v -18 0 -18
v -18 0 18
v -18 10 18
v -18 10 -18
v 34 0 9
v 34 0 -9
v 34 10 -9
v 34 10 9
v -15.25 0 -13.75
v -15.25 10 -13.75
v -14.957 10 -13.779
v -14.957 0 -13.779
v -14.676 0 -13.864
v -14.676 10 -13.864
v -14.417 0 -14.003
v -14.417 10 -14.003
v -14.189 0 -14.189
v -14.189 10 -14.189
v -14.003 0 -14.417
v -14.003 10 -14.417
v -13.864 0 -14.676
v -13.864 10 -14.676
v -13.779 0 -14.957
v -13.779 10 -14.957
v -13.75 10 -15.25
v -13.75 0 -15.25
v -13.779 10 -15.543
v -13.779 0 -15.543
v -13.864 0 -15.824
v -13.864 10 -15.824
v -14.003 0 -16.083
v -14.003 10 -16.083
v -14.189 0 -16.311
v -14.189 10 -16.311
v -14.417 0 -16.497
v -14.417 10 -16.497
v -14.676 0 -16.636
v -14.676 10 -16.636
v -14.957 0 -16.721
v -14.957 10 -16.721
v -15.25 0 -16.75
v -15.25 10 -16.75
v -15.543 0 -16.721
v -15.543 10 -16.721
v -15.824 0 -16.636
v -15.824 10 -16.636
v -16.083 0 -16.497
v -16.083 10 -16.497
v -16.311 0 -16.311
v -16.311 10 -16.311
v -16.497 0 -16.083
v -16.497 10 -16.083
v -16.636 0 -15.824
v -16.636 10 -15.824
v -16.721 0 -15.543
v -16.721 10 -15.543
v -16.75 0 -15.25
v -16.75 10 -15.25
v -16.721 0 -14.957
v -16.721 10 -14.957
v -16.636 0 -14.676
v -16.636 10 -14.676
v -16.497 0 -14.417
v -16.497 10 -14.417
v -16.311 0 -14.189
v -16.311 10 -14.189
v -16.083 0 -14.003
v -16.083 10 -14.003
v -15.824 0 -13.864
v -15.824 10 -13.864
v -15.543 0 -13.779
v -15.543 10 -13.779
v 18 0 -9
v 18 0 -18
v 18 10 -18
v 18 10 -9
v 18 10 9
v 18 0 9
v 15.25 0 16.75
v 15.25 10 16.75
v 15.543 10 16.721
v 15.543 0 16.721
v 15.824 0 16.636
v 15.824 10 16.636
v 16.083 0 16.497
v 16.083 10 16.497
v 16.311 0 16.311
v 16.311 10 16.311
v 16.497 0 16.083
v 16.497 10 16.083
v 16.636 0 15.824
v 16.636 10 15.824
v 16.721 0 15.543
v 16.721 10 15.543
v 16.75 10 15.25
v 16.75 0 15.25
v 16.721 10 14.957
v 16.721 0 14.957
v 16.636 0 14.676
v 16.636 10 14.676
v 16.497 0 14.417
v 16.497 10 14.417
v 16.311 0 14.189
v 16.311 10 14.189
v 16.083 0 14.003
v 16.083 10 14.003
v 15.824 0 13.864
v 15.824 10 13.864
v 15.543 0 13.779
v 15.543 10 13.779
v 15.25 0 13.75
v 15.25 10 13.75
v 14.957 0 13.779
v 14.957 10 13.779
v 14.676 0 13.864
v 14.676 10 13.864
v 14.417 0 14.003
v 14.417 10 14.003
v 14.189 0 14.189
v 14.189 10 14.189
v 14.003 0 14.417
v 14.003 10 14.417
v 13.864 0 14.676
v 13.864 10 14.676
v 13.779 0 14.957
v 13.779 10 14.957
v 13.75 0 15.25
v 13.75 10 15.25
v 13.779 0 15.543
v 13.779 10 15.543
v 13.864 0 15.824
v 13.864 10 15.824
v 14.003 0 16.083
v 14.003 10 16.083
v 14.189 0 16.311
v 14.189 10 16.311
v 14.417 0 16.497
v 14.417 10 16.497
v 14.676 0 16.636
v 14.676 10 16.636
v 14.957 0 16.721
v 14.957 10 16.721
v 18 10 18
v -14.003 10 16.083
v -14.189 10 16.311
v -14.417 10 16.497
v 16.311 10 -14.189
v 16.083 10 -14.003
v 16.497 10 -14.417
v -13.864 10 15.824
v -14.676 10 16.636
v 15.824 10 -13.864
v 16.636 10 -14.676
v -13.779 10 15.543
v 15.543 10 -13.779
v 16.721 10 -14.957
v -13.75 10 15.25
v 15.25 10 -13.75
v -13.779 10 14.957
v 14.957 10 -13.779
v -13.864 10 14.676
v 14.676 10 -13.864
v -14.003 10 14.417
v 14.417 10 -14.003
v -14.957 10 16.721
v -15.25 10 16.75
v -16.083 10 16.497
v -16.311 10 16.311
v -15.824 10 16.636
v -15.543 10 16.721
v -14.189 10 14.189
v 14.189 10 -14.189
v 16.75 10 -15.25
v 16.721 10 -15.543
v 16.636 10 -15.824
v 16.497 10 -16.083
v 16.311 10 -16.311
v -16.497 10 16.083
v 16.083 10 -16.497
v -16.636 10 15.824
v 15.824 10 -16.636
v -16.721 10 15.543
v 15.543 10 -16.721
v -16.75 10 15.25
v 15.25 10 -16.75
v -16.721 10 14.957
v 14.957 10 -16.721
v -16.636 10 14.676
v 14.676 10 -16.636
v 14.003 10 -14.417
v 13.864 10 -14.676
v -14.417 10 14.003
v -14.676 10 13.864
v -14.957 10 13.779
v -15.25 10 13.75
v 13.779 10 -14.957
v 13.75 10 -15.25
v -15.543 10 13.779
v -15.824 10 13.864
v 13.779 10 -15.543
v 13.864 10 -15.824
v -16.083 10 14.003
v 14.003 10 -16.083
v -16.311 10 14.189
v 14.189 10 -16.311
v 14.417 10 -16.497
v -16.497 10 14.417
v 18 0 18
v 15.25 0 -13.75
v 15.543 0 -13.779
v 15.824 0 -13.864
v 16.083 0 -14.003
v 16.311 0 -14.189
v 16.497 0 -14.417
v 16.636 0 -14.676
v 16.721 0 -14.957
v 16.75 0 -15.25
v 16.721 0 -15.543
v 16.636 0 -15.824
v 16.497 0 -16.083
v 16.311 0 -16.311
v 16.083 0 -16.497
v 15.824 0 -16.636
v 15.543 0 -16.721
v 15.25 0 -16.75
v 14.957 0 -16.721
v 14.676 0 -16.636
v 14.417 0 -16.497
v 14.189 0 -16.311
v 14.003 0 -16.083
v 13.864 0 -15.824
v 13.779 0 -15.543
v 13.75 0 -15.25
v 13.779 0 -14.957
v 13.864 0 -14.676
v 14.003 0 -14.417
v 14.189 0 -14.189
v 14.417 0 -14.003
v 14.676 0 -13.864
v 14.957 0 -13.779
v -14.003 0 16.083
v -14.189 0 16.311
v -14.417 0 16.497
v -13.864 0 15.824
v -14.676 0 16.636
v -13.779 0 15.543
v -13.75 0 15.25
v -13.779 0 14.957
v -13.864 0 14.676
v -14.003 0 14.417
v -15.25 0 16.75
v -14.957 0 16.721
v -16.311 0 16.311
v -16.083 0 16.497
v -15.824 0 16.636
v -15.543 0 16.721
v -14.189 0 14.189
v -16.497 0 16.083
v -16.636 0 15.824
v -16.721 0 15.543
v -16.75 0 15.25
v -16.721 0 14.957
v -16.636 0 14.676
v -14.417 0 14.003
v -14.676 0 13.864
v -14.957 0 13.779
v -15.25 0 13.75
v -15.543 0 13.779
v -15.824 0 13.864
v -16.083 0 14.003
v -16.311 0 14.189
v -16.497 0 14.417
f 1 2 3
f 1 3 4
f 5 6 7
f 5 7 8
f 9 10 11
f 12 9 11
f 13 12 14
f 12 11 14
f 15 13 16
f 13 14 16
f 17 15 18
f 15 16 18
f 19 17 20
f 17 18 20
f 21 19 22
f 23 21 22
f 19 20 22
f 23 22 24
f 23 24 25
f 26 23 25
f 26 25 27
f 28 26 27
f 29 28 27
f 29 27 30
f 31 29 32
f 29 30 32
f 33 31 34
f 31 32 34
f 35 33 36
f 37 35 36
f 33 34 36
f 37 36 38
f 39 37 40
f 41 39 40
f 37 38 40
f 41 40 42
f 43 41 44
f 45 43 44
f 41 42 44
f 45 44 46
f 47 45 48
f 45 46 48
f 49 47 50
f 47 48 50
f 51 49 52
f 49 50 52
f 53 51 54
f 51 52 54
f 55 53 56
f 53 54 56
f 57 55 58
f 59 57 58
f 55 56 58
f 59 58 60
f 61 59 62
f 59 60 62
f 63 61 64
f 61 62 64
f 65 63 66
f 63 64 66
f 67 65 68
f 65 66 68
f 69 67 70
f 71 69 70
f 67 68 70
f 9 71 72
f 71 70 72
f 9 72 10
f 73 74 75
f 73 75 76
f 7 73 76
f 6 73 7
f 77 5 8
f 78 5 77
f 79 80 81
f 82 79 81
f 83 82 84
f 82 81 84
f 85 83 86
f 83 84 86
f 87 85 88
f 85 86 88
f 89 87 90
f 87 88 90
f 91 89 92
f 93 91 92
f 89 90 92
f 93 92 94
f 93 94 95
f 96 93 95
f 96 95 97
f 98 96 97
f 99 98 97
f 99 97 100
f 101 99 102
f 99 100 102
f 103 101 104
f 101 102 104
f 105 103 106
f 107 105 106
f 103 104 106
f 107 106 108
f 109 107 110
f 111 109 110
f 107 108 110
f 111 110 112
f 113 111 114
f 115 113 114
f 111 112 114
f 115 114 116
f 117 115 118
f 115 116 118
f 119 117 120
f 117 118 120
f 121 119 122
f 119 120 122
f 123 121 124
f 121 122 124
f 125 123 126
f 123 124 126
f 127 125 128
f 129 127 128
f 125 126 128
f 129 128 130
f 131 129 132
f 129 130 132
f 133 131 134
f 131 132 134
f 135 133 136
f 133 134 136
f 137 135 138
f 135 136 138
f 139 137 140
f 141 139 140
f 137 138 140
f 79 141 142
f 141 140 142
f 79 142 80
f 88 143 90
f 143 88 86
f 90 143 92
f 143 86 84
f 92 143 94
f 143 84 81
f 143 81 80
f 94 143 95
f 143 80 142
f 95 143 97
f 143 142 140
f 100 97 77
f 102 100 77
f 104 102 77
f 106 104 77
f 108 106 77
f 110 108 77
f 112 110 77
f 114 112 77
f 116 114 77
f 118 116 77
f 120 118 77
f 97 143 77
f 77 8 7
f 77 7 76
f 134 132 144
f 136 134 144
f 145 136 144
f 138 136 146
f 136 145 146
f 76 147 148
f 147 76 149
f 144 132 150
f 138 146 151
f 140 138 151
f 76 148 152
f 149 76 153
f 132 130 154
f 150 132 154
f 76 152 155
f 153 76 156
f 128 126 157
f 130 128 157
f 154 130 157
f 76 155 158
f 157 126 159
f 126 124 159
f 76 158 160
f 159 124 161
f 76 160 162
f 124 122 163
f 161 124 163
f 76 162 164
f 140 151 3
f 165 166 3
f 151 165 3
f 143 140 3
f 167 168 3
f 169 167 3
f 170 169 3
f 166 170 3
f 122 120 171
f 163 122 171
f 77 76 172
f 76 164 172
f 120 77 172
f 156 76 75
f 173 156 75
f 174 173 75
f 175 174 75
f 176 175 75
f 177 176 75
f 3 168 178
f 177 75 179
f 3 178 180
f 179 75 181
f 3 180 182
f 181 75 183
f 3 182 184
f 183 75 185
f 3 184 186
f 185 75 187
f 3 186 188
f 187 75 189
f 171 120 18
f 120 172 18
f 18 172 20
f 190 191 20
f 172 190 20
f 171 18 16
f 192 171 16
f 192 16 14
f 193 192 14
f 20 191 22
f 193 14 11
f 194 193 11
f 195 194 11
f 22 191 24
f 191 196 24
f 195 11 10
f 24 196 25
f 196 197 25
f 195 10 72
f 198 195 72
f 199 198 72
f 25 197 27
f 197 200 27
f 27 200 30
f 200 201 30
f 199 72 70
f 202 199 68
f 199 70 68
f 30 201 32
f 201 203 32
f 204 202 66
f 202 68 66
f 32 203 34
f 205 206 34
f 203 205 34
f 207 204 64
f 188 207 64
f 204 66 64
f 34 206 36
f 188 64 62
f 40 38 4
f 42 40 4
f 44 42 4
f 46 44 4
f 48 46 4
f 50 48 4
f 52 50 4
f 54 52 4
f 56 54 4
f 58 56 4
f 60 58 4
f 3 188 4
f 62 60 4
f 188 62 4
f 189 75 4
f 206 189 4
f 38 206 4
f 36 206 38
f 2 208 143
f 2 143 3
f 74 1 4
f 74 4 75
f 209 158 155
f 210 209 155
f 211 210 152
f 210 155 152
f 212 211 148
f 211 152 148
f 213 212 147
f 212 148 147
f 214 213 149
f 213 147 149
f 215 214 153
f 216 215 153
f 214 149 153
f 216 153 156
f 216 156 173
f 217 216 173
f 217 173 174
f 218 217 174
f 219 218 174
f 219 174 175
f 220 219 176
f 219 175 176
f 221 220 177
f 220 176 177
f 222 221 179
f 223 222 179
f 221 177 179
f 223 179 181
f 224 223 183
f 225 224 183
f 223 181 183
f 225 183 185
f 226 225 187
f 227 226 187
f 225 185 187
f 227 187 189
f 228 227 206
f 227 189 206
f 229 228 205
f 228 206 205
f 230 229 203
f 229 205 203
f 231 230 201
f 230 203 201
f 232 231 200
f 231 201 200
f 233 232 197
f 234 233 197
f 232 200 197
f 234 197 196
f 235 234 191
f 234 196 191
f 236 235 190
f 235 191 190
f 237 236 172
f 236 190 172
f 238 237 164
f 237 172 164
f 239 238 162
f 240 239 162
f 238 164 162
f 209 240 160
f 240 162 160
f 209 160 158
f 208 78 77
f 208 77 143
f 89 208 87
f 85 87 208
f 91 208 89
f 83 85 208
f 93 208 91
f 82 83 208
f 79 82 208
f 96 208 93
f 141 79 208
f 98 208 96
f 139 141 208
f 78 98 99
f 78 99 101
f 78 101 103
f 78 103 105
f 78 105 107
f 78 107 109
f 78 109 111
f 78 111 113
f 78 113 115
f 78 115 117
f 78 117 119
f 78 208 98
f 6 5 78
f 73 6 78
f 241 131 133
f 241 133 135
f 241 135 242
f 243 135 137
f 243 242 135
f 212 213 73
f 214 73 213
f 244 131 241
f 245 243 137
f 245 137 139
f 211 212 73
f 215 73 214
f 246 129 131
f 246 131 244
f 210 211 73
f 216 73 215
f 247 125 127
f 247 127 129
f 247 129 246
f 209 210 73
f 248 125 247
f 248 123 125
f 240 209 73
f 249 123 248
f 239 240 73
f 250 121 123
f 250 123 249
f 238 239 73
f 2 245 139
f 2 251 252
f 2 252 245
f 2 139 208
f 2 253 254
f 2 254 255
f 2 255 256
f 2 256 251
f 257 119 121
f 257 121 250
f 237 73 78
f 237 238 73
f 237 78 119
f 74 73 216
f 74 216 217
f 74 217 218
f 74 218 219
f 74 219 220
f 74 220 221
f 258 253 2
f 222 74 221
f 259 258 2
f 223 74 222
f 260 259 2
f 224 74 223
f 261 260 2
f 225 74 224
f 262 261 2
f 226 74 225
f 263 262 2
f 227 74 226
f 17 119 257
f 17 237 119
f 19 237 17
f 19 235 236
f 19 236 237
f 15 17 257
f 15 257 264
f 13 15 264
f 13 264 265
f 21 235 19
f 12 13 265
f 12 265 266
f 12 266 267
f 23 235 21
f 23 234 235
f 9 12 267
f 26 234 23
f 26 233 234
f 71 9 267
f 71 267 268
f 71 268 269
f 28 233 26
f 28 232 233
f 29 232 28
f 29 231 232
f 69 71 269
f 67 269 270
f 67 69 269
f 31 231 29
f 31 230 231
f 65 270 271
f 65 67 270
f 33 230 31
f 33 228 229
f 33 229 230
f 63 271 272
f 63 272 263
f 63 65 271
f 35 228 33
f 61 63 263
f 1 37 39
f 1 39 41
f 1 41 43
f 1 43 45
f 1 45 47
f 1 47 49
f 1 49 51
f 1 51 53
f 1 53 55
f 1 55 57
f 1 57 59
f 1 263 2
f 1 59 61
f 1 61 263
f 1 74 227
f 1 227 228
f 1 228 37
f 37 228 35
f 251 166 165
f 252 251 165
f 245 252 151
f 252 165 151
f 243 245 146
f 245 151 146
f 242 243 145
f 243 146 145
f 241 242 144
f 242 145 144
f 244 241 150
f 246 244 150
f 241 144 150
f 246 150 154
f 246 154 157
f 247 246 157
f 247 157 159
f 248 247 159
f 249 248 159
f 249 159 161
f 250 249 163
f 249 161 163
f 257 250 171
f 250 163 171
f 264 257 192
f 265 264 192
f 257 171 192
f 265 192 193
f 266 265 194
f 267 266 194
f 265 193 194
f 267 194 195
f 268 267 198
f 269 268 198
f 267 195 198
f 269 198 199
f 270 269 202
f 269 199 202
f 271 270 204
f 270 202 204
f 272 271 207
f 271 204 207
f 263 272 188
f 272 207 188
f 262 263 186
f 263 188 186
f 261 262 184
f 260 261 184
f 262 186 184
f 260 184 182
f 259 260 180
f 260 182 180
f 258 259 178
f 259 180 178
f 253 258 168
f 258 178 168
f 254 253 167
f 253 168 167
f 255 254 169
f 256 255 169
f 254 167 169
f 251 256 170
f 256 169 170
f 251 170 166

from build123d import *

# Parameters (mm, degrees)
BOSS_EXTRUDE1_DEPTH = 10
SKETCH2_R           = 1.5
CUT_EXTRUDE1_DEPTH  = 10


with BuildPart() as part:
    # Sketch1 → Boss-Extrude1 (new body)
    with BuildSketch(Plane(origin=(0, 0, 0), x_dir=(1, 0, 0), z_dir=(0, 1, 0))):
        Polygon((18, -9), (18, -18), (-18, -18), (-18, 18), (18, 18), (18, 9), (34, 9), (34, -9), align=None)
    extrude(amount=BOSS_EXTRUDE1_DEPTH)

    # Sketch2 → Cut-Extrude1 (cut)
    with BuildSketch(Plane(origin=(0, 10, 0), x_dir=(1, 0, 0), z_dir=(0, 1, 0))):
        with Locations(Location((-15.25, 15.25, 0), (0, 0, 270))):
            Circle(SKETCH2_R)
        with Locations(Location((15.25, 15.25, 0), (0, 0, 270))):
            Circle(SKETCH2_R)
        with Locations(Location((-15.25, -15.25, 0), (0, 0, 270))):
            Circle(SKETCH2_R)
        with Locations(Location((15.25, -15.25, 0), (0, 0, 270))):
            Circle(SKETCH2_R)
    extrude(amount=-CUT_EXTRUDE1_DEPTH, mode=Mode.SUBTRACT)


solid = part.part
